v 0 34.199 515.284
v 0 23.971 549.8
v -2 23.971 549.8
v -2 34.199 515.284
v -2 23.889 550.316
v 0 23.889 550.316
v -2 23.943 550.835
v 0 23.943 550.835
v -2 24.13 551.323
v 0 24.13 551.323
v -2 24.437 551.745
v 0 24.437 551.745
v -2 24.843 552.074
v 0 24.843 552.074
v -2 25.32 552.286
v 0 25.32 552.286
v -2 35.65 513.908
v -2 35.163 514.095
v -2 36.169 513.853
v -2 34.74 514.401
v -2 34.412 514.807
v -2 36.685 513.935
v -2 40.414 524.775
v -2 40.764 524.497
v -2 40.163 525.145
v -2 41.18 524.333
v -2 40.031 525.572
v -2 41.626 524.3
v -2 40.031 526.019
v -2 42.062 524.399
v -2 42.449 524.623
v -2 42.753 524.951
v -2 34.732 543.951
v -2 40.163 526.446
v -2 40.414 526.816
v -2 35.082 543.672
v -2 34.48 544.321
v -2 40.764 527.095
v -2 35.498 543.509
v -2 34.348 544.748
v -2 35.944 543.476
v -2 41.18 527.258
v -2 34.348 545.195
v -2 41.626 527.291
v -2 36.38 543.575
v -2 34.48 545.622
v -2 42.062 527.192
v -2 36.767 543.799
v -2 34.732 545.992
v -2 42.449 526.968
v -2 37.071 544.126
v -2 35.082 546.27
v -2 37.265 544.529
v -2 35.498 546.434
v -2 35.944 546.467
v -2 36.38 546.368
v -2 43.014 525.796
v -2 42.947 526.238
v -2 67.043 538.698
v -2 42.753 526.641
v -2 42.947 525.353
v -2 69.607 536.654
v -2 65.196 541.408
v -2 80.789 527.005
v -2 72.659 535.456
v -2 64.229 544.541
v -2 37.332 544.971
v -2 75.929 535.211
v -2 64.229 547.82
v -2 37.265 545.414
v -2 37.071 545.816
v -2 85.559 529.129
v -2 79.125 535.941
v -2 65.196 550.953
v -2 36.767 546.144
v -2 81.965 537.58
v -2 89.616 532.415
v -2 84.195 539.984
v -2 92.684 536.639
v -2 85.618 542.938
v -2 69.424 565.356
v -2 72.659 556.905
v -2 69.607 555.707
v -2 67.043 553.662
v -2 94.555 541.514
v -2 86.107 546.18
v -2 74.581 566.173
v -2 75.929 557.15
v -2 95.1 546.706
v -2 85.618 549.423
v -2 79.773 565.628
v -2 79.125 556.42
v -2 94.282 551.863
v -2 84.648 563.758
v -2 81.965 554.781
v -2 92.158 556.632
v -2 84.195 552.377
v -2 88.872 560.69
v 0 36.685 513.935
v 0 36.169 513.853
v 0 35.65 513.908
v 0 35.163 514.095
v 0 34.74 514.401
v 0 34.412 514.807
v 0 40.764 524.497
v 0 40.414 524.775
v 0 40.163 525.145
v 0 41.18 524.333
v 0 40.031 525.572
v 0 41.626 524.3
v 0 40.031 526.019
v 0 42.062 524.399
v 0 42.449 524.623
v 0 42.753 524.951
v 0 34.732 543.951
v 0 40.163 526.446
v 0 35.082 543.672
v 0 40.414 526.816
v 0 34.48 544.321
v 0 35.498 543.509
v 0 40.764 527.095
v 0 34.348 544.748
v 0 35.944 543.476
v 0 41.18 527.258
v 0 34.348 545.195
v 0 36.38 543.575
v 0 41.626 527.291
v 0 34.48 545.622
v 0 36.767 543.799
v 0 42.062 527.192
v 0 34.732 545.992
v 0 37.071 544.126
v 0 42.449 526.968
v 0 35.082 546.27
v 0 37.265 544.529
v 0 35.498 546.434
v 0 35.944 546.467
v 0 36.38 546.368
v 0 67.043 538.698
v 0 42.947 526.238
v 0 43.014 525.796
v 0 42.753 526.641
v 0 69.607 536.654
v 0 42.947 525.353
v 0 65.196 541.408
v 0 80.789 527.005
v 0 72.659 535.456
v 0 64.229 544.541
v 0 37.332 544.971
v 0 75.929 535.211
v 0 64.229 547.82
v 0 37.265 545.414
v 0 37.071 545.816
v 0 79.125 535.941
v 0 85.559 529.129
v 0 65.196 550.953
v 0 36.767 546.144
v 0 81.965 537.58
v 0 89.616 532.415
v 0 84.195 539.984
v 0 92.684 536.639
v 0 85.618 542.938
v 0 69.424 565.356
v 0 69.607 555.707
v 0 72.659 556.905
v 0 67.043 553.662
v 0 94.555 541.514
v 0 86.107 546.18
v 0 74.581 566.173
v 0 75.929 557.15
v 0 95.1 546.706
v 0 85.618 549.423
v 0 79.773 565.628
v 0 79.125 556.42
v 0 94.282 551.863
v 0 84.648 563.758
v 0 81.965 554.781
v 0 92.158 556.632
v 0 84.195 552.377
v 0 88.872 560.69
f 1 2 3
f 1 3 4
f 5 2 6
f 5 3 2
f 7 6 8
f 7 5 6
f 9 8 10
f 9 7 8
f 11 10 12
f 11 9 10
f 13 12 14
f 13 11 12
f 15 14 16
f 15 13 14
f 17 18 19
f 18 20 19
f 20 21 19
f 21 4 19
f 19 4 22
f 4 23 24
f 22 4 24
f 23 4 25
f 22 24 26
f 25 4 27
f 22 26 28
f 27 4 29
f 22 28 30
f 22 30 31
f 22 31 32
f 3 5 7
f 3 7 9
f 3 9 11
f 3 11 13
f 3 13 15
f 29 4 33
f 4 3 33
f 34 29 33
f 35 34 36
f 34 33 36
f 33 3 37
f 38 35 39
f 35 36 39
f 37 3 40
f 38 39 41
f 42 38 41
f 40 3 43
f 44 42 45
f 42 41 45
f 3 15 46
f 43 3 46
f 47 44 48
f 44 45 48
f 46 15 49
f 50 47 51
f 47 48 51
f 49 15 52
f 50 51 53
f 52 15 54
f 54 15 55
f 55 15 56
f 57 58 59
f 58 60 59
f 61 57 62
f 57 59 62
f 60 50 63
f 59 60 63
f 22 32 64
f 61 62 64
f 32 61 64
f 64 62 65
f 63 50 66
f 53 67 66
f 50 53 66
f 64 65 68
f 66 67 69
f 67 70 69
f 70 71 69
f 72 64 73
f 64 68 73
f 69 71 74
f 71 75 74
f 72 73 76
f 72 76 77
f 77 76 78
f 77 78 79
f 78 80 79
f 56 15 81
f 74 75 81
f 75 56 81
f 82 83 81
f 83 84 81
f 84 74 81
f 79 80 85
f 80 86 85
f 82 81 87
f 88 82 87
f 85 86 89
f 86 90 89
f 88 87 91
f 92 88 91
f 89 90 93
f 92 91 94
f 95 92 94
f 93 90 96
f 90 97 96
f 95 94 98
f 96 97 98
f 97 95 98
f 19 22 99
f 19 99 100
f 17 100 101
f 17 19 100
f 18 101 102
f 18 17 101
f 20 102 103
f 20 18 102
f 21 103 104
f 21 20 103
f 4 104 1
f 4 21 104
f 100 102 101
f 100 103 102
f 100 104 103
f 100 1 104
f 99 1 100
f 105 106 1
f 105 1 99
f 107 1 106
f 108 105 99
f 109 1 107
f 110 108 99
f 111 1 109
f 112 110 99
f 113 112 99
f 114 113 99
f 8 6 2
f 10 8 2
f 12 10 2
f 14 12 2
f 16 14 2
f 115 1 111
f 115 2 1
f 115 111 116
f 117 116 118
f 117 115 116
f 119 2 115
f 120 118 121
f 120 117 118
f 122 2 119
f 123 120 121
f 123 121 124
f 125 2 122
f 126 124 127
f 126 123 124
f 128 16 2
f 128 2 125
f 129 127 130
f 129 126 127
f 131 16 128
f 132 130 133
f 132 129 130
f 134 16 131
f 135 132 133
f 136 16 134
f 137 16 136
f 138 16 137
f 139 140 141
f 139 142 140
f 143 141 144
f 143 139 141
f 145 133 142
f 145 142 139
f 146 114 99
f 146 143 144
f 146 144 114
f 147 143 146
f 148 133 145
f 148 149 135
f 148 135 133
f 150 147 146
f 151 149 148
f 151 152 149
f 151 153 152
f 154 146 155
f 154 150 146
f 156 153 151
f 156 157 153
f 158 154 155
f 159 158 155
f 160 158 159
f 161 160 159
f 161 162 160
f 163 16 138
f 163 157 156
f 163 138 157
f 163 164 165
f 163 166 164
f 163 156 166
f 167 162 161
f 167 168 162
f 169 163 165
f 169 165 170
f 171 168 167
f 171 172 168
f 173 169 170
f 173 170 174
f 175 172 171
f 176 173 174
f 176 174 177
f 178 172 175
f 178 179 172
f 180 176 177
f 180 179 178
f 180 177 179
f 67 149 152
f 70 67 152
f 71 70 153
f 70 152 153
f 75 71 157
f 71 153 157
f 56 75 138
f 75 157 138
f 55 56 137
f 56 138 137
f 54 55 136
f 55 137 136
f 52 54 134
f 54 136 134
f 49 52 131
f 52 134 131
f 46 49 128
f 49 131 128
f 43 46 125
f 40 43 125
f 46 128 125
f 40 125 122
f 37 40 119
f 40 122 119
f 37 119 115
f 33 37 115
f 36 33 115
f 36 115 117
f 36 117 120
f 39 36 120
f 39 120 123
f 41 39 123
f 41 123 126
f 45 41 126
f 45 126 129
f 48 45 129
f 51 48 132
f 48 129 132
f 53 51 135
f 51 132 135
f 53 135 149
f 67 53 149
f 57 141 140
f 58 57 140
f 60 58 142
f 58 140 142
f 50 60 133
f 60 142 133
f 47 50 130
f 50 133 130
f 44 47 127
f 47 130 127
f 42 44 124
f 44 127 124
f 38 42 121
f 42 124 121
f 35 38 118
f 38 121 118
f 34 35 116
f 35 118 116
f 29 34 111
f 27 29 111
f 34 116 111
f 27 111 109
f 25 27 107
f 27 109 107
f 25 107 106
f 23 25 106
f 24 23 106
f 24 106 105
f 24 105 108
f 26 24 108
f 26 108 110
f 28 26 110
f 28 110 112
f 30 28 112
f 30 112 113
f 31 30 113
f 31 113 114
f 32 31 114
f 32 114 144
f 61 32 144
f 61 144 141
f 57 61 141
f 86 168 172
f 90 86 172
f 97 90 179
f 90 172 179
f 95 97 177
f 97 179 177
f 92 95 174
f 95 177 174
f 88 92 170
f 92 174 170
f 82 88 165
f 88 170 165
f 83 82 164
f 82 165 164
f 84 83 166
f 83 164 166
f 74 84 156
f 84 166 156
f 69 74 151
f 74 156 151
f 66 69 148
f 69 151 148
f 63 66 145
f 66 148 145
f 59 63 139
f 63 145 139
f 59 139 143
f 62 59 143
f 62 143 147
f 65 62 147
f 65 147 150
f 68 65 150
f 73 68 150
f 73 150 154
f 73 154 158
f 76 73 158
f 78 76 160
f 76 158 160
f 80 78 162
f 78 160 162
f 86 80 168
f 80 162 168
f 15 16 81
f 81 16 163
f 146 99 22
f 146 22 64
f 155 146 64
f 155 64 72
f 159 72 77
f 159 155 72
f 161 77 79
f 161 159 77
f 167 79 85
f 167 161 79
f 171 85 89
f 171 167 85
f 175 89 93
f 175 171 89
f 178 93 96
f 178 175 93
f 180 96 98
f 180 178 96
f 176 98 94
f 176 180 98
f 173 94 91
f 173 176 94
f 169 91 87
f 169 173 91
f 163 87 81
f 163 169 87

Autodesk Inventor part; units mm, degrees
ref_plane "YZ Plane" through (0, 0, 0) normal (1, 0, 0) x (0, 1, 0)
ref_plane "XZ Plane" through (0, 0, 0) normal (0, 1, 0) x (-1, 0, 0)
ref_plane "XY Plane" through (0, 0, 0) normal (0, 0, 1) x (1, 0, 0)
sketch "スケッチ1" plane through (0, 0, 0) normal (1, 0, 0) x (0, 1, 0)
  circle A0 centre (75.1066, 546.1804) radius 20
  line L0 (398.3077, -642.9996) -> (12.4603, 659.0318)
  line L1 (-81.8954, -654.6507) -> (-61.8954, -654.6507)
  line L2 (-6.7154, 653.3493) -> (379.132, -648.6822)
  line L3 (23.4023, 551.7179) -> (69.424, 565.3561)
  line L4 (34.7675, 513.3665) -> (80.7892, 527.0047)
  circle A1 centre (75.1066, 546.1804) radius 11
  line L5 (12.4603, 659.0318) -> (-6.7154, 653.3493)
  circle A2 centre (35.8315, 544.9714) radius 1.5
  circle A3 centre (41.514, 525.7956) radius 1.5
  point P0 (0, 0)
  point P1 (-384.8954, -222.3173)
  dimension "d0" = 40
  dimension "d1" = 28
  dimension "d2" = 22
  dimension "d3" = 106
  dimension "d4" = 3
  dimension "d5" = 3
  dimension "d6" = 10
  dimension "d7" = 10
  dimension "d8" = 10
  dimension "d9" = 20
extrude "押し出し1" add sketch "スケッチ1" against normal blind 2 contours A0 | A0 L4 L0 L3 | L0 L4 L2 L3
fillet "フィレット1" radius 2 2 edges at (-1, 23.4023, 551.7179) (-1, 34.7675, 513.3665)
equation "\"d7\" = d6"
equation "\"d8\" = d6"
properties part number "dribl-v1-Plate-13" material "アルミニウム 6061"
